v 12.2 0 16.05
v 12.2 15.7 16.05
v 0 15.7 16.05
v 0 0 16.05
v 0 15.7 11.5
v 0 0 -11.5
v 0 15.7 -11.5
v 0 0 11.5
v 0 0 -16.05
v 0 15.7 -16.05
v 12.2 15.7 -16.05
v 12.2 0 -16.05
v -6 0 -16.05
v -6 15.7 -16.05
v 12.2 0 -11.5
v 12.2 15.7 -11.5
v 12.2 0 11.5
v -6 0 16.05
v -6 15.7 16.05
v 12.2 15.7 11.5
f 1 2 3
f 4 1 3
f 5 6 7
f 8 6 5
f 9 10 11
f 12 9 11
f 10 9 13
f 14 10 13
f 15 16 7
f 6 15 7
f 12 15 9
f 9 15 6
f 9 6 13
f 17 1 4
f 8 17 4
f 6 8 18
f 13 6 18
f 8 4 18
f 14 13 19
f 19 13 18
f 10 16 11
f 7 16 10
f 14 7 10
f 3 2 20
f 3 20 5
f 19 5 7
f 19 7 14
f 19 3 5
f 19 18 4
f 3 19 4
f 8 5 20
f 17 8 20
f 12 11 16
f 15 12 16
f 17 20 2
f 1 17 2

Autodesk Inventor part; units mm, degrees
ref_plane "YZ Plane" through (0, 0, 0) normal (1, 0, 0) x (0, 1, 0)
ref_plane "XZ Plane" through (0, 0, 0) normal (0, 1, 0) x (-1, 0, 0)
ref_plane "XY Plane" through (0, 0, 0) normal (0, 0, 1) x (1, 0, 0)
sketch "Sketch1" plane through (0, 0, 0) normal (0, 1, 0) x (-1, 0, 0)
  line L0 (0, -11.5) -> (0, 11.5) construction
  line L1 (0, -16.05) -> (0, 16.05) construction
  line L2 (0, -16.05) -> (-12.2, -16.05)
  line L3 (-12.2, -16.05) -> (-12.2, -11.5)
  line L4 (-12.2, -11.5) -> (0, -11.5)
  line L5 (0, -11.5) -> (0, -16.05) construction
  line L6 (0, 11.5) -> (-12.2, 11.5)
  line L7 (-12.2, 11.5) -> (-12.2, 16.05)
  line L8 (-12.2, 16.05) -> (0, 16.05)
  line L9 (0, 16.05) -> (0, 11.5) construction
  line L10 (0, -16.05) -> (6, -16.05)
  line L11 (6, -16.05) -> (6, 16.05)
  line L12 (6, 16.05) -> (0, 16.05)
  line L13 (0, -11.5) -> (0, 11.5)
  point P0 (0, 0)
  point P1 (0, 0)
  dimension "d0" = 23
  dimension "d1" = 32.1
  dimension "d2" = 12.2
  dimension "d3" = 6
extrude "Extrusion1" add sketch "Sketch1" along normal blind 15.7
sketch "Sketch2" plane through (12.2, 0, -16.05) normal (0, 0, -1) x (-1, 0, 0)
  line L0 (18.2, 0) -> (18.2, 15.7) projected
  line L1 (18.2, 9.2581) -> (21.2, 10.35)
  line L2 (21.2, 10.35) -> (21.2, 5.35)
  line L3 (21.2, 5.35) -> (18.2, 6.4419)
  line L4 (18.2, 7.85) -> (21.2, 7.85) construction
  point P0 (12.2, 0)
  dimension "d6" = 3
  dimension "d7" = 70
  dimension "d8" = 5
properties part number "Soporte Servo SG90"
